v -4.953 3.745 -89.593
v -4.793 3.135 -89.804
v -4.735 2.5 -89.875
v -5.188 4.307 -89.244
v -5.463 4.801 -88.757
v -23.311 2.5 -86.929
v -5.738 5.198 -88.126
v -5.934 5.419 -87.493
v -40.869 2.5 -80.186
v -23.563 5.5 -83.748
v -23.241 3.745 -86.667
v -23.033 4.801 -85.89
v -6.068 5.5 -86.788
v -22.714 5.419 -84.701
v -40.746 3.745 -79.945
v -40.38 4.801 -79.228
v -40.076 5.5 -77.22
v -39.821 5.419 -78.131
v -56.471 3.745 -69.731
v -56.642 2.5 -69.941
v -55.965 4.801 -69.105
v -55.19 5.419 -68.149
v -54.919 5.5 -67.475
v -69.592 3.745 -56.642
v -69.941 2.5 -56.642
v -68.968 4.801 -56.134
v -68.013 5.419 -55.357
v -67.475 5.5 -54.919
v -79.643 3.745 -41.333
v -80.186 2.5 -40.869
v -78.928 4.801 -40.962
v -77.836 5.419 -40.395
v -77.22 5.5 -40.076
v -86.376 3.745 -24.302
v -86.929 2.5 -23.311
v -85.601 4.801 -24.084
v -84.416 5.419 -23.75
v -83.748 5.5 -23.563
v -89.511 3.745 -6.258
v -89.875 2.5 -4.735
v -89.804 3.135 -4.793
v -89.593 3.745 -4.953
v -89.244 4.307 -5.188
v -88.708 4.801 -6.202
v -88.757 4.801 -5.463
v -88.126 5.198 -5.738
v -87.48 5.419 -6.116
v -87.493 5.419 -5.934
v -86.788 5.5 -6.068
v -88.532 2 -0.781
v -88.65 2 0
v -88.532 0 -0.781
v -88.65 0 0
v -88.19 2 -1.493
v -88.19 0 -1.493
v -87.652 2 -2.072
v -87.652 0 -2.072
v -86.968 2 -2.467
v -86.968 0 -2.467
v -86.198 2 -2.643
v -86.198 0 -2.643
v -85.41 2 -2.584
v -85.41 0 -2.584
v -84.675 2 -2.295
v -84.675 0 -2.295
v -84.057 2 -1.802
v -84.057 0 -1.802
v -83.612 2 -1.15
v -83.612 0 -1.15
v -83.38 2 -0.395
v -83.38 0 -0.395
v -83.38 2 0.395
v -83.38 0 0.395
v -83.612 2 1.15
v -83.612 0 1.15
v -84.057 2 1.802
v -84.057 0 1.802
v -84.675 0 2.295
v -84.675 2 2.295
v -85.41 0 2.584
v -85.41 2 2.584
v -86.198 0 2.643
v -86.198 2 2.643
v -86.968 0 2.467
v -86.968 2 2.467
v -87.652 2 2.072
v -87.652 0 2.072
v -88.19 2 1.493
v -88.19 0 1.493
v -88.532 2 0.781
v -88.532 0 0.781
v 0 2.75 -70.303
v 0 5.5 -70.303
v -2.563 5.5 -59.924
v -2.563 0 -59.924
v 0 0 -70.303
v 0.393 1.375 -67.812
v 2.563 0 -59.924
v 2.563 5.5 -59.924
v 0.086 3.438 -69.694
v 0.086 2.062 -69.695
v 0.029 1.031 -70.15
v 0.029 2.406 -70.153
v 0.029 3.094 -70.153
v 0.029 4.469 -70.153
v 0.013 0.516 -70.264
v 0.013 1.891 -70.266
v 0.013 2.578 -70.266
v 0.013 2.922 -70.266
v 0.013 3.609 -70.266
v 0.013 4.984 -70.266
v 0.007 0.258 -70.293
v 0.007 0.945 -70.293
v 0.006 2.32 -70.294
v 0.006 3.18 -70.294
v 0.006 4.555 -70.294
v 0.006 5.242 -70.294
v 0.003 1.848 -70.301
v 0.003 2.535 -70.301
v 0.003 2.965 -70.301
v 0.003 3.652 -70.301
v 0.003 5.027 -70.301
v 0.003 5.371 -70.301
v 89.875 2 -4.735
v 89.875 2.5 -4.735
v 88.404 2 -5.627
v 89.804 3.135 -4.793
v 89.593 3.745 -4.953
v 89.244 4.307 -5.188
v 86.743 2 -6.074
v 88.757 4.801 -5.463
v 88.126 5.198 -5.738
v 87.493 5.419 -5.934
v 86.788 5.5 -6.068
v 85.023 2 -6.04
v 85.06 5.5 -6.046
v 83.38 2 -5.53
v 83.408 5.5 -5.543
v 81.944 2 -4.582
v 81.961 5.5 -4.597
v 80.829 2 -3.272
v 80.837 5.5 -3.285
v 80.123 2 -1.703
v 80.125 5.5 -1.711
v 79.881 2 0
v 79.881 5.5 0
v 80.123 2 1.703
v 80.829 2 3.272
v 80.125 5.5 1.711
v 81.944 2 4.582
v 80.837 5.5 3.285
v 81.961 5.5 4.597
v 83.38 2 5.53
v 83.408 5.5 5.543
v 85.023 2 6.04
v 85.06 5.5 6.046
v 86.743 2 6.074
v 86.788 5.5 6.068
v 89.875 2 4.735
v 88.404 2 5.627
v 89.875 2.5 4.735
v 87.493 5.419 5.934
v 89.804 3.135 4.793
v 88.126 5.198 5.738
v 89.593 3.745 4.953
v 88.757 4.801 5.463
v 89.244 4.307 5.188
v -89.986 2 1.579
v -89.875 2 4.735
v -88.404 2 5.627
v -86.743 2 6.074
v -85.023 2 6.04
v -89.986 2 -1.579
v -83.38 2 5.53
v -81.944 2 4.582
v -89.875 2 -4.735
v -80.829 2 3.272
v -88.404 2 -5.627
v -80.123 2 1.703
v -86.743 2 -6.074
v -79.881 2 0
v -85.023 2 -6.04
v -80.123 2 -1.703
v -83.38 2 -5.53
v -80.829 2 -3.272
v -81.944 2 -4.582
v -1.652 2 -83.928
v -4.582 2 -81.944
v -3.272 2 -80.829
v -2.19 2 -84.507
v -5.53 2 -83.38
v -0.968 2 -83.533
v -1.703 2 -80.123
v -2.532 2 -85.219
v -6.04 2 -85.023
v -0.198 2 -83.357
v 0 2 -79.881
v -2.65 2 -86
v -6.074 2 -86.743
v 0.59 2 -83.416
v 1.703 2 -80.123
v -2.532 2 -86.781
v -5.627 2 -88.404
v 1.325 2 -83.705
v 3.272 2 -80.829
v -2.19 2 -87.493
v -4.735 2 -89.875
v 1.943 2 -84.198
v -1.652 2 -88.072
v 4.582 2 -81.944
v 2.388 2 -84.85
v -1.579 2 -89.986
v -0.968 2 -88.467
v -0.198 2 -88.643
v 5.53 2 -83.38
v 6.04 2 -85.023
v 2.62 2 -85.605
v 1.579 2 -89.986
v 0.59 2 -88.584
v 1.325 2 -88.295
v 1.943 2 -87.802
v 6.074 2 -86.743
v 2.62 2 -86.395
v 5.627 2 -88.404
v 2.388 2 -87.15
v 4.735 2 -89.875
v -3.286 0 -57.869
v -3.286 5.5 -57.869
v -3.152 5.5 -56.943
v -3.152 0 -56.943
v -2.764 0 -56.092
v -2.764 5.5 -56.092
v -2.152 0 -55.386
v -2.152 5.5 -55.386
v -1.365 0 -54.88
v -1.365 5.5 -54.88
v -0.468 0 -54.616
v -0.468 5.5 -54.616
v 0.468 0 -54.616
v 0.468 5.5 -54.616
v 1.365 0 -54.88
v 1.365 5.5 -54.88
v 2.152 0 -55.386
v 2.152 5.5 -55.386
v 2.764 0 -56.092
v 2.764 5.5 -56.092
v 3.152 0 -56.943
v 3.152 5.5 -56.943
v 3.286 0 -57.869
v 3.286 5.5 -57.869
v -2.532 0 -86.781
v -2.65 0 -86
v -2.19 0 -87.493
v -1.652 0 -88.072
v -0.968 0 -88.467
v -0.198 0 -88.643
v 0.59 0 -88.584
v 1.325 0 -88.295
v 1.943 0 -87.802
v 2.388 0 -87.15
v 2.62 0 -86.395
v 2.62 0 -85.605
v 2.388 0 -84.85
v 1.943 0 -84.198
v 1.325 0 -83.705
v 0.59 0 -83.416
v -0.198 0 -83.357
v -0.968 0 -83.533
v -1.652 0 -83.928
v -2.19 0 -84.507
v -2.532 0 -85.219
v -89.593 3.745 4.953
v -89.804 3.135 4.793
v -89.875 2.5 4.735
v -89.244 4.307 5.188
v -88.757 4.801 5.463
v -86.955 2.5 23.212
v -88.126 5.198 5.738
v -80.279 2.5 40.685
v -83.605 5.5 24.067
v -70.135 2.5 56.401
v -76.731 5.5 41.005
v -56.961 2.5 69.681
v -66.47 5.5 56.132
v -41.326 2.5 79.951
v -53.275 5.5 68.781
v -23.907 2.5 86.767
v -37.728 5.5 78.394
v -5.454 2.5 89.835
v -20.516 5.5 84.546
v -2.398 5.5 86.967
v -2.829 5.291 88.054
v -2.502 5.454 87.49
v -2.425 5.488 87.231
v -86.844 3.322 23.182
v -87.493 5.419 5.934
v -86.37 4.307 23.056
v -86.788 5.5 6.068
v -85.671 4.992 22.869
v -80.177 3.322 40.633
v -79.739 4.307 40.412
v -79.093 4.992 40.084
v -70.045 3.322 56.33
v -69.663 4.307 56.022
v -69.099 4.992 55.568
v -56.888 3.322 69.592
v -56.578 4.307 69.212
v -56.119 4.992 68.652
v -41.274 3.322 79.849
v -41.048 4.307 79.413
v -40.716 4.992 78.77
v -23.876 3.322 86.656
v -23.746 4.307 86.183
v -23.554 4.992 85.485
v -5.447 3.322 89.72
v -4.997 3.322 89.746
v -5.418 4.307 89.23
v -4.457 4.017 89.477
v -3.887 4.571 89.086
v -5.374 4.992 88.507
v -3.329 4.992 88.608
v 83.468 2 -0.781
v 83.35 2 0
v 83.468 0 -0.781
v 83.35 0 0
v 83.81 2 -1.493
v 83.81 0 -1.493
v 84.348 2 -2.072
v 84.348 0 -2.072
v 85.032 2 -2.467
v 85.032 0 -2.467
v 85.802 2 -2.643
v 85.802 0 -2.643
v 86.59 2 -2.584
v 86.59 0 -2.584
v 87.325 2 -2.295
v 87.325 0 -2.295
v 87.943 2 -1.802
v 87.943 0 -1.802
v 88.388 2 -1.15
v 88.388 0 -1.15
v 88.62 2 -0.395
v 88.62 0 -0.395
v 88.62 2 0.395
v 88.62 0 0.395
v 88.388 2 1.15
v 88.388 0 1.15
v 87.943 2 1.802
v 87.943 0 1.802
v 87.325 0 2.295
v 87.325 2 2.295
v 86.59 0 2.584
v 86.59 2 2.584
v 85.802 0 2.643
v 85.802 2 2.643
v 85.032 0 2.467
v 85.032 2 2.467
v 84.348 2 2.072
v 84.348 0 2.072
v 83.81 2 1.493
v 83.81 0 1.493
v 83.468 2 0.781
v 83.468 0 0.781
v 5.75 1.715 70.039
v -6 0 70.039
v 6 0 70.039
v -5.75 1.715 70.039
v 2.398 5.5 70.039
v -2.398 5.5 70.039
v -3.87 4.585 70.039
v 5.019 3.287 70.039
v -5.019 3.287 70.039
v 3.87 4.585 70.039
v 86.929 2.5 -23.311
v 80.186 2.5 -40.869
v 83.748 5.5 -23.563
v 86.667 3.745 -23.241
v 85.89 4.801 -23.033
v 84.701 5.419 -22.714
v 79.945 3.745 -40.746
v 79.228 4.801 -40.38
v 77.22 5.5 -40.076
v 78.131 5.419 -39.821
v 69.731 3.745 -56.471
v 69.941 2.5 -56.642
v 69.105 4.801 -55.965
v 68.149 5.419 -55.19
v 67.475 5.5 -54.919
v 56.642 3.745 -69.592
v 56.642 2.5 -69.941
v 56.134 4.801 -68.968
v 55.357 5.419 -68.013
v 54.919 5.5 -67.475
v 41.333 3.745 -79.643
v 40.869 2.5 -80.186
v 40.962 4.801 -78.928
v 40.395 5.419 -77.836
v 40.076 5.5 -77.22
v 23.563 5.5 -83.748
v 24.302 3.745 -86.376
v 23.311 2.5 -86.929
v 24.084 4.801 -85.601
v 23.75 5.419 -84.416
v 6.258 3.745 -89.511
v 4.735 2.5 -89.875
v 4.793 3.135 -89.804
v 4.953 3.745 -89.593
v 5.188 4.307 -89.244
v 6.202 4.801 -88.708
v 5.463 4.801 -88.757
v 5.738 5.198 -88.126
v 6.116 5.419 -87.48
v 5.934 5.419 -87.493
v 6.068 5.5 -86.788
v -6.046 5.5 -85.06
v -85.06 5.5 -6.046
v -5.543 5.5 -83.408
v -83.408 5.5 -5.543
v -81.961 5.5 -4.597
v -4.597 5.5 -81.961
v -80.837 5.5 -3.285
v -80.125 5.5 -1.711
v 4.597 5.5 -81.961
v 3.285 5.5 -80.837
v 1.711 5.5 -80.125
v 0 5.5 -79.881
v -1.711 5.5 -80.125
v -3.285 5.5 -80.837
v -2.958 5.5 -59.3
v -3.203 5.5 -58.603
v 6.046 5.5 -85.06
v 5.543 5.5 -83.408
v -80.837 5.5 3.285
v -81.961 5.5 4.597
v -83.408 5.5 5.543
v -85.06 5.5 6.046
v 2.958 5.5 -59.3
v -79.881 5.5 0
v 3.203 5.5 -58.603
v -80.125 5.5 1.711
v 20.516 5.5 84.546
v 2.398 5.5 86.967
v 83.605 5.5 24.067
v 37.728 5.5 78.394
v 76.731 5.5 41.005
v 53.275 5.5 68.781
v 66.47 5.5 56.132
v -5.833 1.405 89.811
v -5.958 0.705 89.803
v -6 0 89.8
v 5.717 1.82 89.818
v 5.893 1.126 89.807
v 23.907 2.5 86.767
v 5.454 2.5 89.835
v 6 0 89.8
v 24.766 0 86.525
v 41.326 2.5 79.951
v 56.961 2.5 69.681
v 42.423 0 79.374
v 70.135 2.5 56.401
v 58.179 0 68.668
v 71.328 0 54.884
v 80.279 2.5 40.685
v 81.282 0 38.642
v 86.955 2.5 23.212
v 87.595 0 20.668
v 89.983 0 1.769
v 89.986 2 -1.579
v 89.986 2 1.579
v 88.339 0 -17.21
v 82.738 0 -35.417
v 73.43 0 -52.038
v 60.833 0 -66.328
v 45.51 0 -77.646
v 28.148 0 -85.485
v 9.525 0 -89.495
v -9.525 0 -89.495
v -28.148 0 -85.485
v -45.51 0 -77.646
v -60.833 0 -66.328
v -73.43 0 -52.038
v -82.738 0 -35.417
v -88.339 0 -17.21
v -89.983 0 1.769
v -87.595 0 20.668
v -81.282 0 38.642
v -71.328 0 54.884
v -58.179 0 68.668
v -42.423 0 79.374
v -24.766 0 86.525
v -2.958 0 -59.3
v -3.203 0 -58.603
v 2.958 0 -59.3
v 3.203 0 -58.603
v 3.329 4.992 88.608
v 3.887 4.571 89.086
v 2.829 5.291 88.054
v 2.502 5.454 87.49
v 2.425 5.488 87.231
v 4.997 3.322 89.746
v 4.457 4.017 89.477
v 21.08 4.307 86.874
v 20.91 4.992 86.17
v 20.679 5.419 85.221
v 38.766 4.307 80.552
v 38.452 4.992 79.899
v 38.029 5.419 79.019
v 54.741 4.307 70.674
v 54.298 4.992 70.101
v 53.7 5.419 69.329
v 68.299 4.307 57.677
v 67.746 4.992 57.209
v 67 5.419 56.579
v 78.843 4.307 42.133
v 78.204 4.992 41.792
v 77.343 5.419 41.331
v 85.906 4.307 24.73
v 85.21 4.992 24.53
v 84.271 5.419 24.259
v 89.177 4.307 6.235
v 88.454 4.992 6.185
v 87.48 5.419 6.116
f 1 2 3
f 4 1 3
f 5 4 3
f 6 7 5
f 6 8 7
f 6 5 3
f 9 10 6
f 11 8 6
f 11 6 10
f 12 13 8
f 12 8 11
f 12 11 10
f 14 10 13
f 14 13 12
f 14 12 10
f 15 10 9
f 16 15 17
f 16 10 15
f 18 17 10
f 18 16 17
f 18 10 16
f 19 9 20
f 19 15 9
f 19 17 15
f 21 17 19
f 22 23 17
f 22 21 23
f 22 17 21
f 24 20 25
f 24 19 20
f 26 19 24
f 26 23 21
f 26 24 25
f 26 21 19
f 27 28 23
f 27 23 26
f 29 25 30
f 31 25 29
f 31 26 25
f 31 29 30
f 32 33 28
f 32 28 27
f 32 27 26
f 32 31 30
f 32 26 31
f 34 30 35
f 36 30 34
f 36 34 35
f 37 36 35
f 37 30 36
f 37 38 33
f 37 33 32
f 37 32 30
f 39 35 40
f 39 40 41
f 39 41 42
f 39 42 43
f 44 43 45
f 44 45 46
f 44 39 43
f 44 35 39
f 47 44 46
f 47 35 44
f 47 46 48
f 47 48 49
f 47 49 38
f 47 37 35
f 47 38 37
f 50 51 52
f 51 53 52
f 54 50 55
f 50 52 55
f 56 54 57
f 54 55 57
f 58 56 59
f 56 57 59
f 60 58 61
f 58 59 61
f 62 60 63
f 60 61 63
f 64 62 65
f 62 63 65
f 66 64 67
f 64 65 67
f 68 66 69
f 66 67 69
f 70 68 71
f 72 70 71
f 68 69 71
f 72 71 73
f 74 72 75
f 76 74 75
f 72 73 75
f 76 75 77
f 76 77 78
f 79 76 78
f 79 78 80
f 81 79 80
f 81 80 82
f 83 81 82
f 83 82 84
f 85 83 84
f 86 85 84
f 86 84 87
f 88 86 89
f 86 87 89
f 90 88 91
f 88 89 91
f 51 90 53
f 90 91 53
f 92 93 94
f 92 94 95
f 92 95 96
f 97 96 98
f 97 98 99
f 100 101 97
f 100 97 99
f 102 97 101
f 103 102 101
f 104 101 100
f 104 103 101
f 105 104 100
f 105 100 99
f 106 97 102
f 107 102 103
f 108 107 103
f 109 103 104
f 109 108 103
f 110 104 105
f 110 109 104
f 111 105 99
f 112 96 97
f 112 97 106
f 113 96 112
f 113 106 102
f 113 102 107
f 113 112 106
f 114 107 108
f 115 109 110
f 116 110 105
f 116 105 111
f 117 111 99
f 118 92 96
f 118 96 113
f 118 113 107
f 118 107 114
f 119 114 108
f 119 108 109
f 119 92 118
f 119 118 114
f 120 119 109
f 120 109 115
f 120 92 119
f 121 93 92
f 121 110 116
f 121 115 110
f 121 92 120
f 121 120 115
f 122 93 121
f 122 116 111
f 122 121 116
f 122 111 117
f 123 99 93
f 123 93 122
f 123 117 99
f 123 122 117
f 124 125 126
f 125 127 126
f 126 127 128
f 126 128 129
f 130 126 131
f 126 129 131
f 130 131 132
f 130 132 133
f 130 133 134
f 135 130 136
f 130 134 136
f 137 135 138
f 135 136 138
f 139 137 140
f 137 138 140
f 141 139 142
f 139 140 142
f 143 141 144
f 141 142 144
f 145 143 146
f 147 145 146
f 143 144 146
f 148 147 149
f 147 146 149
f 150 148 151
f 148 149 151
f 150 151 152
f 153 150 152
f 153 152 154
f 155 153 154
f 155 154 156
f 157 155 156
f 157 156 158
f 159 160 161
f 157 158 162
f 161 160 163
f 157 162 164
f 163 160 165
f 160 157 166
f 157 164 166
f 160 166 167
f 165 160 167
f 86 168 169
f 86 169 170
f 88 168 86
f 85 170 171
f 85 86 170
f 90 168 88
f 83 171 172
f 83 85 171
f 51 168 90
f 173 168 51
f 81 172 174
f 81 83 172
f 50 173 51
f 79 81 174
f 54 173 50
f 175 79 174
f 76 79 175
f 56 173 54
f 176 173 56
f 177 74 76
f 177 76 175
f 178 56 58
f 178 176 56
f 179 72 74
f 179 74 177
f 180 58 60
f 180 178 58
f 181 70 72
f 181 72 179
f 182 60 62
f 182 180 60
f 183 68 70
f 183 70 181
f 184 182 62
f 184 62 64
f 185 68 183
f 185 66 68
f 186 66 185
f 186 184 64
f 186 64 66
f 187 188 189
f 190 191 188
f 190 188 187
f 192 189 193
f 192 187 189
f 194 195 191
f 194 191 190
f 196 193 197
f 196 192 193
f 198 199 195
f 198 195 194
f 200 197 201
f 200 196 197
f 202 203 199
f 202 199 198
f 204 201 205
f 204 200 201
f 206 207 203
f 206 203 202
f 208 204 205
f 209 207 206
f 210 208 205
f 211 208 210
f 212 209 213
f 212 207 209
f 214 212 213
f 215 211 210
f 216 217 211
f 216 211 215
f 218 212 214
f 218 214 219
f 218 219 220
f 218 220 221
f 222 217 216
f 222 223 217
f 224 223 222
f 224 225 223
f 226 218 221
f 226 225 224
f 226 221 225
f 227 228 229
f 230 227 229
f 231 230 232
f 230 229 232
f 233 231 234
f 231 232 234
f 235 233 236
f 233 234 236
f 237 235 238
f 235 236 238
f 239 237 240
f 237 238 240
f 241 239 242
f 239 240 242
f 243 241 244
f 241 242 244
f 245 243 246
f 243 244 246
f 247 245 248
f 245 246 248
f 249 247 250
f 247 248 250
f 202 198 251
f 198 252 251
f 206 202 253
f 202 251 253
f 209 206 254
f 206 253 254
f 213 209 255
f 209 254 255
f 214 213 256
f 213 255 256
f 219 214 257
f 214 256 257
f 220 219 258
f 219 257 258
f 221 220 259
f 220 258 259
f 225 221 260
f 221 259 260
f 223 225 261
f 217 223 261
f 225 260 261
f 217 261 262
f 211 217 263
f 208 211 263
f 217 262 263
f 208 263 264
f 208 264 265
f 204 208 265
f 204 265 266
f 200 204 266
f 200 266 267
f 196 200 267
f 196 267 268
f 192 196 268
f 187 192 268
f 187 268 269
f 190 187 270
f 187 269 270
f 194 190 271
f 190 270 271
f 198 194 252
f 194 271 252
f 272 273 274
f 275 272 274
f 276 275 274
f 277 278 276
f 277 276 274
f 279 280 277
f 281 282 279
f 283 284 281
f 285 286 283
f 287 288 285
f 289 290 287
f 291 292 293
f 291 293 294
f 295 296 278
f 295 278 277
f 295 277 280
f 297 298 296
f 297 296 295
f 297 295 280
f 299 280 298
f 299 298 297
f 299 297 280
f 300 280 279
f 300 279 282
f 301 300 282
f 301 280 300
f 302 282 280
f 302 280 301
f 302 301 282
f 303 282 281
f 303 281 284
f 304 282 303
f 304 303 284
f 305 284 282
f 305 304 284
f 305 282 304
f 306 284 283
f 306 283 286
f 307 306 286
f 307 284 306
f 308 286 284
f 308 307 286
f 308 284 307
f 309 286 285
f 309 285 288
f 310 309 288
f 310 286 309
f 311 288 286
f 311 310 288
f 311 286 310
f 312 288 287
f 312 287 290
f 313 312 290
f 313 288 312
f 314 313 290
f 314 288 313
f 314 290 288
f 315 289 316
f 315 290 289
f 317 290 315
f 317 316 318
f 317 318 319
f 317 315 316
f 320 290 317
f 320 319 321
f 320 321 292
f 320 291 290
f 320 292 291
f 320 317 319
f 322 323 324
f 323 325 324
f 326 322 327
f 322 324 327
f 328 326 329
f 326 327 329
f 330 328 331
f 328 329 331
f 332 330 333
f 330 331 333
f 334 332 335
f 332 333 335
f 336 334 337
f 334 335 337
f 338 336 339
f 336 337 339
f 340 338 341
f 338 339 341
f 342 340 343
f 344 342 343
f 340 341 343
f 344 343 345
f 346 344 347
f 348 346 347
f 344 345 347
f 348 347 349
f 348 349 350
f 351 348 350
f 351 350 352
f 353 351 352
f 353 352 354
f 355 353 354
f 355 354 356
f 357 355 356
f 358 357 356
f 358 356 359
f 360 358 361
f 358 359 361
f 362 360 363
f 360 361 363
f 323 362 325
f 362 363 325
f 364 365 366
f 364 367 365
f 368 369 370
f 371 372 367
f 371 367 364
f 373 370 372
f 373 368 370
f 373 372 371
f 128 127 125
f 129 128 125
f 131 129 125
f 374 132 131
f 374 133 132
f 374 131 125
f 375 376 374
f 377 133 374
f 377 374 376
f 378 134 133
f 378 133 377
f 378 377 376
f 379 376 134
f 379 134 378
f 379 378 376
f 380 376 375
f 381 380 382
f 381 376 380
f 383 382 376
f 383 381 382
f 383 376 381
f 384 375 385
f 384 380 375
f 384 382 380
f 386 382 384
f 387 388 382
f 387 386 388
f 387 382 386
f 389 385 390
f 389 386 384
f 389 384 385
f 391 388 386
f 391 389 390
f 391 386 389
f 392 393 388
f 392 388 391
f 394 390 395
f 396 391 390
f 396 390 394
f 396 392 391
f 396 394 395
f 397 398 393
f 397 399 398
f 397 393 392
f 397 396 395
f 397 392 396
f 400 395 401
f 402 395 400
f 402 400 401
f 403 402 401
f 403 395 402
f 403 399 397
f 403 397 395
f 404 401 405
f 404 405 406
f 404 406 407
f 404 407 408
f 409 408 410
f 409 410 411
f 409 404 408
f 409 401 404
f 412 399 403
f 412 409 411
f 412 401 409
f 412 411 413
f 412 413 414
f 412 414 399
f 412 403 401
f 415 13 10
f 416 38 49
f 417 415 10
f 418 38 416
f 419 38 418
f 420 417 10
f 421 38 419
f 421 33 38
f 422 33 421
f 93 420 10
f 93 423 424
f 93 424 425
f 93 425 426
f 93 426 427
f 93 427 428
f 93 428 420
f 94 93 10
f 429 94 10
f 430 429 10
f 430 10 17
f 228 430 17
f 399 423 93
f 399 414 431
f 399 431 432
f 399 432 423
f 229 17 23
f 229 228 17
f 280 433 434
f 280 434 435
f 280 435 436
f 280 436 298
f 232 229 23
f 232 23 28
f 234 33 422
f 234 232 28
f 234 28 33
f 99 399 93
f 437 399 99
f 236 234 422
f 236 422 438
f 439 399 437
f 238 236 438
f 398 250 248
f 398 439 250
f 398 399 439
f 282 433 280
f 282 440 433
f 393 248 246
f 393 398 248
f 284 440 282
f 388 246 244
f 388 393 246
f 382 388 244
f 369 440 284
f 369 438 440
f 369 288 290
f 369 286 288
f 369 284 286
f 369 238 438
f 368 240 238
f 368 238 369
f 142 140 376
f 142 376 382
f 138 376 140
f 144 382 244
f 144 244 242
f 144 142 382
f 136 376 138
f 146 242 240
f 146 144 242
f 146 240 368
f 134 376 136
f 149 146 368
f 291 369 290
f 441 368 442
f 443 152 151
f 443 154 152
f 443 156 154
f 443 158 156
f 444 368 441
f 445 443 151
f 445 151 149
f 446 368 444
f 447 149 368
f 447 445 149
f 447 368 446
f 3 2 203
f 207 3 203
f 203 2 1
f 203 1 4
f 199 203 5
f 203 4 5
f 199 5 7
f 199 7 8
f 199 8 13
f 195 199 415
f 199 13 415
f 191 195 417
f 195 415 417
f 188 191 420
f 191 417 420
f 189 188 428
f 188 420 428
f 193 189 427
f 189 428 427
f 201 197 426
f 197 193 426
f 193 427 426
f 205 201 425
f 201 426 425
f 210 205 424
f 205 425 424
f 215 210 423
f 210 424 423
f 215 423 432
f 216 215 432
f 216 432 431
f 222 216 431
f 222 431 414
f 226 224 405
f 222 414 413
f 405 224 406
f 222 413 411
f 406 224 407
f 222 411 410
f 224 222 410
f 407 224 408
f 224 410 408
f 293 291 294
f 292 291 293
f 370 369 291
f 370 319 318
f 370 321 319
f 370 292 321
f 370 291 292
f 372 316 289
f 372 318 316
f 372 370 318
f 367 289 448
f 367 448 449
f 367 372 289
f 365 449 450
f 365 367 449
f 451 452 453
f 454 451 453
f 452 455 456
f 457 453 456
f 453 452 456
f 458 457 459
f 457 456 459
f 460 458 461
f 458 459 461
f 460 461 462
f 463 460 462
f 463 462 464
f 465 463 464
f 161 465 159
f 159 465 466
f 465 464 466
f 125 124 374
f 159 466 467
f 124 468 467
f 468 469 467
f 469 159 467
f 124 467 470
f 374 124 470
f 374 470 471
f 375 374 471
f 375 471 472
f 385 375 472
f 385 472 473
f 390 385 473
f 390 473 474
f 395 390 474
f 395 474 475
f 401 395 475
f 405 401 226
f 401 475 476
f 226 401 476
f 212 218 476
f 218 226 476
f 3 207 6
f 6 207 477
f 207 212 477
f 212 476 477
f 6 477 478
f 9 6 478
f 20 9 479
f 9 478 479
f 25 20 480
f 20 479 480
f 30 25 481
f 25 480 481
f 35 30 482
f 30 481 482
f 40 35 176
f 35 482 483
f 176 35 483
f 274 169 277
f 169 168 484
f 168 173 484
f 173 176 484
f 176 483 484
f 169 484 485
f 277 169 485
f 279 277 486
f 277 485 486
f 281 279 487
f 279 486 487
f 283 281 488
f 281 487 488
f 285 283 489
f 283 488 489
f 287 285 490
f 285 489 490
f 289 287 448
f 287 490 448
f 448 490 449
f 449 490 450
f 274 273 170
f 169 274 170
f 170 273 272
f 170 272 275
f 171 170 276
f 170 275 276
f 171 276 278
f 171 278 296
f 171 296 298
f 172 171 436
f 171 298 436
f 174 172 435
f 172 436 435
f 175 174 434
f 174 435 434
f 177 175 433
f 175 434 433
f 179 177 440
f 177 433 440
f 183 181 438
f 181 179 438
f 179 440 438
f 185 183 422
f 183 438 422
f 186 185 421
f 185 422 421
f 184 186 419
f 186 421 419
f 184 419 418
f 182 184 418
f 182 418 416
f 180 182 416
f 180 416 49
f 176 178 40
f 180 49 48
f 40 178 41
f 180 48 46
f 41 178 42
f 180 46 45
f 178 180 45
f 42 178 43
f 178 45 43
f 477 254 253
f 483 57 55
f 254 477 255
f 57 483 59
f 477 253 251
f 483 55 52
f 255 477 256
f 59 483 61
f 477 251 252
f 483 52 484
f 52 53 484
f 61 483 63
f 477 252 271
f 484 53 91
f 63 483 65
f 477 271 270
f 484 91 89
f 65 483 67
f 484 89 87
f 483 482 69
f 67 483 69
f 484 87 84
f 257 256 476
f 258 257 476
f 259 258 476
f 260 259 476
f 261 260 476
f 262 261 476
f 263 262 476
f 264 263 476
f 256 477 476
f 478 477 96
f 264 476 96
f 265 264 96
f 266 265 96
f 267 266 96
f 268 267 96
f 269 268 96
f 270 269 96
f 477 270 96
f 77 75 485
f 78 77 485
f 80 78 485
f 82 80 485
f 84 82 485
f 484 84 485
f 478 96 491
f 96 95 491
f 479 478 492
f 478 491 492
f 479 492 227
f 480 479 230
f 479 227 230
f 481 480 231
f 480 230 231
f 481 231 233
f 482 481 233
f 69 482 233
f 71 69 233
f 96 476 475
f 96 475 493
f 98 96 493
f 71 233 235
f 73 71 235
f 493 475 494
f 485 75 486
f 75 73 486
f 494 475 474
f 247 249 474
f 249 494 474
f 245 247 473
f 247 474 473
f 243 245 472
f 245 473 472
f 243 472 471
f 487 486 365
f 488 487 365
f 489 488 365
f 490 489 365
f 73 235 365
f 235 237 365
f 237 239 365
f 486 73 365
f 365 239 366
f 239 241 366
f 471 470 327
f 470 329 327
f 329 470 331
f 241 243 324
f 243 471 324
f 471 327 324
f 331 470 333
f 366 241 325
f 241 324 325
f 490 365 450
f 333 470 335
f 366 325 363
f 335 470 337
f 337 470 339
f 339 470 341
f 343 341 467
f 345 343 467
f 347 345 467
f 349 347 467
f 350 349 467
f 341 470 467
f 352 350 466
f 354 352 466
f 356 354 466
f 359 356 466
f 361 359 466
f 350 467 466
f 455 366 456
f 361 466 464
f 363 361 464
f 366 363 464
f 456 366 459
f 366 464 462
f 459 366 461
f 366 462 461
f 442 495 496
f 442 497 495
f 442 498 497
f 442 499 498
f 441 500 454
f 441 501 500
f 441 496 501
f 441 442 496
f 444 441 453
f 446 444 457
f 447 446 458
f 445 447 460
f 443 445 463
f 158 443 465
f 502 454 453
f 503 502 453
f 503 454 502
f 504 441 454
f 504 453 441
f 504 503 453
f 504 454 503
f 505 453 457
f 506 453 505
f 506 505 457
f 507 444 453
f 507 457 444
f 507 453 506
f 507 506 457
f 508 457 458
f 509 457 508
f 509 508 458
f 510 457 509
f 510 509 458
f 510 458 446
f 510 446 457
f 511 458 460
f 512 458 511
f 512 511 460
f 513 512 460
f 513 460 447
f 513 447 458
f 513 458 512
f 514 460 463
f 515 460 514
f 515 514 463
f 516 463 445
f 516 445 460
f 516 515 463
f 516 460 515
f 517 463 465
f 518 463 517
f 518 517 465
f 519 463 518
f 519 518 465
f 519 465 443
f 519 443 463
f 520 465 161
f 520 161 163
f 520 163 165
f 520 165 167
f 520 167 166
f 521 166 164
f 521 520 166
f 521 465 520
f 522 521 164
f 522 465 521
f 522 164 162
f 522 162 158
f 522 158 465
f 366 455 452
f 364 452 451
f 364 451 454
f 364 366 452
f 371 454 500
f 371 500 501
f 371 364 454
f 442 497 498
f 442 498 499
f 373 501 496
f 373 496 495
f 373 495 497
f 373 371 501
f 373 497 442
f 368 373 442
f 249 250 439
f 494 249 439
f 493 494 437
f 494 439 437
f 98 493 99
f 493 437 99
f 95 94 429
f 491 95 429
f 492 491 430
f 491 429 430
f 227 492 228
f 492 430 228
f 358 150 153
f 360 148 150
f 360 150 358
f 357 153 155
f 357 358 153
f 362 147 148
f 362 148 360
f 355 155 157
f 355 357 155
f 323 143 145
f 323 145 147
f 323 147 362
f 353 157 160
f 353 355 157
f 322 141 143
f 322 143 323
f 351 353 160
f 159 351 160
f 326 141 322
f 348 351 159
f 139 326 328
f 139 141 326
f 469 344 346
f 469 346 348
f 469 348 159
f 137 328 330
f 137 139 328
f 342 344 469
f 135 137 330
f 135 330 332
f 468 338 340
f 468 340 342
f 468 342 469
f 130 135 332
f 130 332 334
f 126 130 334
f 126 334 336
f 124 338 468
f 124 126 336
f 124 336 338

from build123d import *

# Parameters (mm, degrees)
SKETCH1_R                                    = 90
BOSS_EXTRUDE1_DEPTH                          = 5.5
CBORE_FOR_M5_HEX_HEAD_CAP_SCREW1_D           = 5.3
CBORE_FOR_M5_HEX_HEAD_CAP_SCREW1_DEPTH       = 6
CBORE_FOR_M5_HEX_HEAD_CAP_SCREW1_CBORE_D     = 12.238
CBORE_FOR_M5_HEX_HEAD_CAP_SCREW1_CBORE_DEPTH = 3.5
CBORE_FOR_M5_HEX_HEAD_CAP_SCREW1_TIP         = 1.59228064
FILLET1_R                                    = 3
CUT_EXTRUDE1_DEPTH                           = 31
CUT_REVOLVE_THIN8_START                      = 70.039018211
CUT_REVOLVE_THIN8_DEPTH                      = 19.960981889


# Read off the part's stored shape, not the designer's step: Cut-Revolve-Thin8
with BuildPart() as part:
    # Sketch1 → Boss-Extrude1 (new body)
    with BuildSketch(Plane(origin=(0, 0, 0), x_dir=(1, 0, 0), z_dir=(0, 1, 0))):
        with Locations(Location((0, 0, 0), (0, 0, 270))):
            Circle(SKETCH1_R)
    extrude(amount=BOSS_EXTRUDE1_DEPTH)

    # CBORE for M5 Hex Head Cap Screw1
    with Locations(Plane(origin=(0, 5.5, 0), x_dir=(1, 0, 0), z_dir=(0, 1, 0))):
        with Locations((0, 86), (-86, 0), (86, 0)):
            CounterBoreHole(CBORE_FOR_M5_HEX_HEAD_CAP_SCREW1_D / 2, CBORE_FOR_M5_HEX_HEAD_CAP_SCREW1_CBORE_D / 2, CBORE_FOR_M5_HEX_HEAD_CAP_SCREW1_CBORE_DEPTH, depth=CBORE_FOR_M5_HEX_HEAD_CAP_SCREW1_DEPTH)
            with Locations((0, 0, -(CBORE_FOR_M5_HEX_HEAD_CAP_SCREW1_DEPTH + CBORE_FOR_M5_HEX_HEAD_CAP_SCREW1_TIP / 2))):  # 118° drill point
                Cone(0, CBORE_FOR_M5_HEX_HEAD_CAP_SCREW1_D / 2, CBORE_FOR_M5_HEX_HEAD_CAP_SCREW1_TIP, mode=Mode.SUBTRACT)

    # Fillet1
    fillet1_edges = [part.edges().sort_by_distance(p)[0] for p in [
        (-61.942775174, 5.5, 65.292362523),
        (-63.639610307, 5.5, -63.639610307),
        (63.639610307, 5.5, -63.639610307),
    ]]
    fillet(fillet1_edges, radius=FILLET1_R)

    # Sketch5 → Cut-Extrude1 (cut)
    with BuildSketch(Plane(origin=(0, 5.5, 0), x_dir=(1, 0, 0), z_dir=(0, 1, 0))):
        with BuildLine():
            add(Edge.make_bspline(
                [(-3.285569008, 57.868614525), (-3.024078757, 58.587053083), (-2.783851066, 59.272048996), (-2.563116696, 59.924191453)],
                knots=[0, 0, 0, 0, 0.04164671, 0.04164671, 0.04164671, 0.04164671], degree=3))
            ThreePointArc((-3.285569008, 57.868614525), (0, 54.583045517), (3.285569008, 57.868614525))
            add(Edge.make_bspline(
                [(2.563054058, 59.924269555), (2.783803493, 59.272145294), (3.0240518, 58.587127147), (3.285569008, 57.868614525)],
                knots=[0.958431192, 0.958431192, 0.958431192, 0.958431192, 1, 1, 1, 1], degree=3))
            ThreePointArc((2.563054058, 59.924269555), (-5.0059e-05, 61.154183532), (-2.563116696, 59.924191453))
        make_face()
        with BuildLine():
            ThreePointArc((-2.563116696, 59.924191453), (-3.099698411, 58.958033389), (-3.285569008, 57.868614525))
            add(Edge.make_bspline(
                [(-3.285569008, 57.868614525), (-3.024078757, 58.587053083), (-2.783851066, 59.272048996), (-2.563116696, 59.924191453)],
                knots=[0, 0, 0, 0, 0.04164671, 0.04164671, 0.04164671, 0.04164671], degree=3))
        make_face()
        with BuildLine():
            add(Edge.make_bspline(
                [(2.563054058, 59.924269555), (2.783803493, 59.272145294), (3.0240518, 58.587127147), (3.285569008, 57.868614525)],
                knots=[0.958431192, 0.958431192, 0.958431192, 0.958431192, 1, 1, 1, 1], degree=3))
            ThreePointArc((3.285569008, 57.868614525), (3.099681813, 58.958080616), (2.563054058, 59.924269555))
        make_face()
        with BuildLine():
            add(Edge.make_bspline(
                [(-2.563116696, 59.924191453), (-0.133769336, 67.101508499), (0.002619877, 73.497835408), (0.128574166, 67.116058723), (2.563054058, 59.924269555)],
                knots=[0.04164671, 0.04164671, 0.04164671, 0.04164671, 0.5, 0.958431192, 0.958431192, 0.958431192, 0.958431192], degree=3))
            ThreePointArc((-2.563116696, 59.924191453), (-5.0059e-05, 61.154183532), (2.563054058, 59.924269555))
        make_face()
    extrude(amount=-CUT_EXTRUDE1_DEPTH, mode=Mode.SUBTRACT)

    # Cut-Revolve-Thin8 outline → Cut-Revolve-Thin8 (cut)
    with BuildSketch(Plane.XY.offset(CUT_REVOLVE_THIN8_START)):
        with BuildLine():
            Line((-6, 0), (6, 0))
            ThreePointArc((6, 0), (5.019337335, 3.287286528), (2.397915762, 5.5))
            Line((2.397915762, 5.5), (-2.397915762, 5.5))
            ThreePointArc((-2.397915762, 5.5), (-5.019337335, 3.287286528), (-6, 0))
        make_face()
    extrude(amount=CUT_REVOLVE_THIN8_DEPTH, mode=Mode.SUBTRACT)


solid = part.part
